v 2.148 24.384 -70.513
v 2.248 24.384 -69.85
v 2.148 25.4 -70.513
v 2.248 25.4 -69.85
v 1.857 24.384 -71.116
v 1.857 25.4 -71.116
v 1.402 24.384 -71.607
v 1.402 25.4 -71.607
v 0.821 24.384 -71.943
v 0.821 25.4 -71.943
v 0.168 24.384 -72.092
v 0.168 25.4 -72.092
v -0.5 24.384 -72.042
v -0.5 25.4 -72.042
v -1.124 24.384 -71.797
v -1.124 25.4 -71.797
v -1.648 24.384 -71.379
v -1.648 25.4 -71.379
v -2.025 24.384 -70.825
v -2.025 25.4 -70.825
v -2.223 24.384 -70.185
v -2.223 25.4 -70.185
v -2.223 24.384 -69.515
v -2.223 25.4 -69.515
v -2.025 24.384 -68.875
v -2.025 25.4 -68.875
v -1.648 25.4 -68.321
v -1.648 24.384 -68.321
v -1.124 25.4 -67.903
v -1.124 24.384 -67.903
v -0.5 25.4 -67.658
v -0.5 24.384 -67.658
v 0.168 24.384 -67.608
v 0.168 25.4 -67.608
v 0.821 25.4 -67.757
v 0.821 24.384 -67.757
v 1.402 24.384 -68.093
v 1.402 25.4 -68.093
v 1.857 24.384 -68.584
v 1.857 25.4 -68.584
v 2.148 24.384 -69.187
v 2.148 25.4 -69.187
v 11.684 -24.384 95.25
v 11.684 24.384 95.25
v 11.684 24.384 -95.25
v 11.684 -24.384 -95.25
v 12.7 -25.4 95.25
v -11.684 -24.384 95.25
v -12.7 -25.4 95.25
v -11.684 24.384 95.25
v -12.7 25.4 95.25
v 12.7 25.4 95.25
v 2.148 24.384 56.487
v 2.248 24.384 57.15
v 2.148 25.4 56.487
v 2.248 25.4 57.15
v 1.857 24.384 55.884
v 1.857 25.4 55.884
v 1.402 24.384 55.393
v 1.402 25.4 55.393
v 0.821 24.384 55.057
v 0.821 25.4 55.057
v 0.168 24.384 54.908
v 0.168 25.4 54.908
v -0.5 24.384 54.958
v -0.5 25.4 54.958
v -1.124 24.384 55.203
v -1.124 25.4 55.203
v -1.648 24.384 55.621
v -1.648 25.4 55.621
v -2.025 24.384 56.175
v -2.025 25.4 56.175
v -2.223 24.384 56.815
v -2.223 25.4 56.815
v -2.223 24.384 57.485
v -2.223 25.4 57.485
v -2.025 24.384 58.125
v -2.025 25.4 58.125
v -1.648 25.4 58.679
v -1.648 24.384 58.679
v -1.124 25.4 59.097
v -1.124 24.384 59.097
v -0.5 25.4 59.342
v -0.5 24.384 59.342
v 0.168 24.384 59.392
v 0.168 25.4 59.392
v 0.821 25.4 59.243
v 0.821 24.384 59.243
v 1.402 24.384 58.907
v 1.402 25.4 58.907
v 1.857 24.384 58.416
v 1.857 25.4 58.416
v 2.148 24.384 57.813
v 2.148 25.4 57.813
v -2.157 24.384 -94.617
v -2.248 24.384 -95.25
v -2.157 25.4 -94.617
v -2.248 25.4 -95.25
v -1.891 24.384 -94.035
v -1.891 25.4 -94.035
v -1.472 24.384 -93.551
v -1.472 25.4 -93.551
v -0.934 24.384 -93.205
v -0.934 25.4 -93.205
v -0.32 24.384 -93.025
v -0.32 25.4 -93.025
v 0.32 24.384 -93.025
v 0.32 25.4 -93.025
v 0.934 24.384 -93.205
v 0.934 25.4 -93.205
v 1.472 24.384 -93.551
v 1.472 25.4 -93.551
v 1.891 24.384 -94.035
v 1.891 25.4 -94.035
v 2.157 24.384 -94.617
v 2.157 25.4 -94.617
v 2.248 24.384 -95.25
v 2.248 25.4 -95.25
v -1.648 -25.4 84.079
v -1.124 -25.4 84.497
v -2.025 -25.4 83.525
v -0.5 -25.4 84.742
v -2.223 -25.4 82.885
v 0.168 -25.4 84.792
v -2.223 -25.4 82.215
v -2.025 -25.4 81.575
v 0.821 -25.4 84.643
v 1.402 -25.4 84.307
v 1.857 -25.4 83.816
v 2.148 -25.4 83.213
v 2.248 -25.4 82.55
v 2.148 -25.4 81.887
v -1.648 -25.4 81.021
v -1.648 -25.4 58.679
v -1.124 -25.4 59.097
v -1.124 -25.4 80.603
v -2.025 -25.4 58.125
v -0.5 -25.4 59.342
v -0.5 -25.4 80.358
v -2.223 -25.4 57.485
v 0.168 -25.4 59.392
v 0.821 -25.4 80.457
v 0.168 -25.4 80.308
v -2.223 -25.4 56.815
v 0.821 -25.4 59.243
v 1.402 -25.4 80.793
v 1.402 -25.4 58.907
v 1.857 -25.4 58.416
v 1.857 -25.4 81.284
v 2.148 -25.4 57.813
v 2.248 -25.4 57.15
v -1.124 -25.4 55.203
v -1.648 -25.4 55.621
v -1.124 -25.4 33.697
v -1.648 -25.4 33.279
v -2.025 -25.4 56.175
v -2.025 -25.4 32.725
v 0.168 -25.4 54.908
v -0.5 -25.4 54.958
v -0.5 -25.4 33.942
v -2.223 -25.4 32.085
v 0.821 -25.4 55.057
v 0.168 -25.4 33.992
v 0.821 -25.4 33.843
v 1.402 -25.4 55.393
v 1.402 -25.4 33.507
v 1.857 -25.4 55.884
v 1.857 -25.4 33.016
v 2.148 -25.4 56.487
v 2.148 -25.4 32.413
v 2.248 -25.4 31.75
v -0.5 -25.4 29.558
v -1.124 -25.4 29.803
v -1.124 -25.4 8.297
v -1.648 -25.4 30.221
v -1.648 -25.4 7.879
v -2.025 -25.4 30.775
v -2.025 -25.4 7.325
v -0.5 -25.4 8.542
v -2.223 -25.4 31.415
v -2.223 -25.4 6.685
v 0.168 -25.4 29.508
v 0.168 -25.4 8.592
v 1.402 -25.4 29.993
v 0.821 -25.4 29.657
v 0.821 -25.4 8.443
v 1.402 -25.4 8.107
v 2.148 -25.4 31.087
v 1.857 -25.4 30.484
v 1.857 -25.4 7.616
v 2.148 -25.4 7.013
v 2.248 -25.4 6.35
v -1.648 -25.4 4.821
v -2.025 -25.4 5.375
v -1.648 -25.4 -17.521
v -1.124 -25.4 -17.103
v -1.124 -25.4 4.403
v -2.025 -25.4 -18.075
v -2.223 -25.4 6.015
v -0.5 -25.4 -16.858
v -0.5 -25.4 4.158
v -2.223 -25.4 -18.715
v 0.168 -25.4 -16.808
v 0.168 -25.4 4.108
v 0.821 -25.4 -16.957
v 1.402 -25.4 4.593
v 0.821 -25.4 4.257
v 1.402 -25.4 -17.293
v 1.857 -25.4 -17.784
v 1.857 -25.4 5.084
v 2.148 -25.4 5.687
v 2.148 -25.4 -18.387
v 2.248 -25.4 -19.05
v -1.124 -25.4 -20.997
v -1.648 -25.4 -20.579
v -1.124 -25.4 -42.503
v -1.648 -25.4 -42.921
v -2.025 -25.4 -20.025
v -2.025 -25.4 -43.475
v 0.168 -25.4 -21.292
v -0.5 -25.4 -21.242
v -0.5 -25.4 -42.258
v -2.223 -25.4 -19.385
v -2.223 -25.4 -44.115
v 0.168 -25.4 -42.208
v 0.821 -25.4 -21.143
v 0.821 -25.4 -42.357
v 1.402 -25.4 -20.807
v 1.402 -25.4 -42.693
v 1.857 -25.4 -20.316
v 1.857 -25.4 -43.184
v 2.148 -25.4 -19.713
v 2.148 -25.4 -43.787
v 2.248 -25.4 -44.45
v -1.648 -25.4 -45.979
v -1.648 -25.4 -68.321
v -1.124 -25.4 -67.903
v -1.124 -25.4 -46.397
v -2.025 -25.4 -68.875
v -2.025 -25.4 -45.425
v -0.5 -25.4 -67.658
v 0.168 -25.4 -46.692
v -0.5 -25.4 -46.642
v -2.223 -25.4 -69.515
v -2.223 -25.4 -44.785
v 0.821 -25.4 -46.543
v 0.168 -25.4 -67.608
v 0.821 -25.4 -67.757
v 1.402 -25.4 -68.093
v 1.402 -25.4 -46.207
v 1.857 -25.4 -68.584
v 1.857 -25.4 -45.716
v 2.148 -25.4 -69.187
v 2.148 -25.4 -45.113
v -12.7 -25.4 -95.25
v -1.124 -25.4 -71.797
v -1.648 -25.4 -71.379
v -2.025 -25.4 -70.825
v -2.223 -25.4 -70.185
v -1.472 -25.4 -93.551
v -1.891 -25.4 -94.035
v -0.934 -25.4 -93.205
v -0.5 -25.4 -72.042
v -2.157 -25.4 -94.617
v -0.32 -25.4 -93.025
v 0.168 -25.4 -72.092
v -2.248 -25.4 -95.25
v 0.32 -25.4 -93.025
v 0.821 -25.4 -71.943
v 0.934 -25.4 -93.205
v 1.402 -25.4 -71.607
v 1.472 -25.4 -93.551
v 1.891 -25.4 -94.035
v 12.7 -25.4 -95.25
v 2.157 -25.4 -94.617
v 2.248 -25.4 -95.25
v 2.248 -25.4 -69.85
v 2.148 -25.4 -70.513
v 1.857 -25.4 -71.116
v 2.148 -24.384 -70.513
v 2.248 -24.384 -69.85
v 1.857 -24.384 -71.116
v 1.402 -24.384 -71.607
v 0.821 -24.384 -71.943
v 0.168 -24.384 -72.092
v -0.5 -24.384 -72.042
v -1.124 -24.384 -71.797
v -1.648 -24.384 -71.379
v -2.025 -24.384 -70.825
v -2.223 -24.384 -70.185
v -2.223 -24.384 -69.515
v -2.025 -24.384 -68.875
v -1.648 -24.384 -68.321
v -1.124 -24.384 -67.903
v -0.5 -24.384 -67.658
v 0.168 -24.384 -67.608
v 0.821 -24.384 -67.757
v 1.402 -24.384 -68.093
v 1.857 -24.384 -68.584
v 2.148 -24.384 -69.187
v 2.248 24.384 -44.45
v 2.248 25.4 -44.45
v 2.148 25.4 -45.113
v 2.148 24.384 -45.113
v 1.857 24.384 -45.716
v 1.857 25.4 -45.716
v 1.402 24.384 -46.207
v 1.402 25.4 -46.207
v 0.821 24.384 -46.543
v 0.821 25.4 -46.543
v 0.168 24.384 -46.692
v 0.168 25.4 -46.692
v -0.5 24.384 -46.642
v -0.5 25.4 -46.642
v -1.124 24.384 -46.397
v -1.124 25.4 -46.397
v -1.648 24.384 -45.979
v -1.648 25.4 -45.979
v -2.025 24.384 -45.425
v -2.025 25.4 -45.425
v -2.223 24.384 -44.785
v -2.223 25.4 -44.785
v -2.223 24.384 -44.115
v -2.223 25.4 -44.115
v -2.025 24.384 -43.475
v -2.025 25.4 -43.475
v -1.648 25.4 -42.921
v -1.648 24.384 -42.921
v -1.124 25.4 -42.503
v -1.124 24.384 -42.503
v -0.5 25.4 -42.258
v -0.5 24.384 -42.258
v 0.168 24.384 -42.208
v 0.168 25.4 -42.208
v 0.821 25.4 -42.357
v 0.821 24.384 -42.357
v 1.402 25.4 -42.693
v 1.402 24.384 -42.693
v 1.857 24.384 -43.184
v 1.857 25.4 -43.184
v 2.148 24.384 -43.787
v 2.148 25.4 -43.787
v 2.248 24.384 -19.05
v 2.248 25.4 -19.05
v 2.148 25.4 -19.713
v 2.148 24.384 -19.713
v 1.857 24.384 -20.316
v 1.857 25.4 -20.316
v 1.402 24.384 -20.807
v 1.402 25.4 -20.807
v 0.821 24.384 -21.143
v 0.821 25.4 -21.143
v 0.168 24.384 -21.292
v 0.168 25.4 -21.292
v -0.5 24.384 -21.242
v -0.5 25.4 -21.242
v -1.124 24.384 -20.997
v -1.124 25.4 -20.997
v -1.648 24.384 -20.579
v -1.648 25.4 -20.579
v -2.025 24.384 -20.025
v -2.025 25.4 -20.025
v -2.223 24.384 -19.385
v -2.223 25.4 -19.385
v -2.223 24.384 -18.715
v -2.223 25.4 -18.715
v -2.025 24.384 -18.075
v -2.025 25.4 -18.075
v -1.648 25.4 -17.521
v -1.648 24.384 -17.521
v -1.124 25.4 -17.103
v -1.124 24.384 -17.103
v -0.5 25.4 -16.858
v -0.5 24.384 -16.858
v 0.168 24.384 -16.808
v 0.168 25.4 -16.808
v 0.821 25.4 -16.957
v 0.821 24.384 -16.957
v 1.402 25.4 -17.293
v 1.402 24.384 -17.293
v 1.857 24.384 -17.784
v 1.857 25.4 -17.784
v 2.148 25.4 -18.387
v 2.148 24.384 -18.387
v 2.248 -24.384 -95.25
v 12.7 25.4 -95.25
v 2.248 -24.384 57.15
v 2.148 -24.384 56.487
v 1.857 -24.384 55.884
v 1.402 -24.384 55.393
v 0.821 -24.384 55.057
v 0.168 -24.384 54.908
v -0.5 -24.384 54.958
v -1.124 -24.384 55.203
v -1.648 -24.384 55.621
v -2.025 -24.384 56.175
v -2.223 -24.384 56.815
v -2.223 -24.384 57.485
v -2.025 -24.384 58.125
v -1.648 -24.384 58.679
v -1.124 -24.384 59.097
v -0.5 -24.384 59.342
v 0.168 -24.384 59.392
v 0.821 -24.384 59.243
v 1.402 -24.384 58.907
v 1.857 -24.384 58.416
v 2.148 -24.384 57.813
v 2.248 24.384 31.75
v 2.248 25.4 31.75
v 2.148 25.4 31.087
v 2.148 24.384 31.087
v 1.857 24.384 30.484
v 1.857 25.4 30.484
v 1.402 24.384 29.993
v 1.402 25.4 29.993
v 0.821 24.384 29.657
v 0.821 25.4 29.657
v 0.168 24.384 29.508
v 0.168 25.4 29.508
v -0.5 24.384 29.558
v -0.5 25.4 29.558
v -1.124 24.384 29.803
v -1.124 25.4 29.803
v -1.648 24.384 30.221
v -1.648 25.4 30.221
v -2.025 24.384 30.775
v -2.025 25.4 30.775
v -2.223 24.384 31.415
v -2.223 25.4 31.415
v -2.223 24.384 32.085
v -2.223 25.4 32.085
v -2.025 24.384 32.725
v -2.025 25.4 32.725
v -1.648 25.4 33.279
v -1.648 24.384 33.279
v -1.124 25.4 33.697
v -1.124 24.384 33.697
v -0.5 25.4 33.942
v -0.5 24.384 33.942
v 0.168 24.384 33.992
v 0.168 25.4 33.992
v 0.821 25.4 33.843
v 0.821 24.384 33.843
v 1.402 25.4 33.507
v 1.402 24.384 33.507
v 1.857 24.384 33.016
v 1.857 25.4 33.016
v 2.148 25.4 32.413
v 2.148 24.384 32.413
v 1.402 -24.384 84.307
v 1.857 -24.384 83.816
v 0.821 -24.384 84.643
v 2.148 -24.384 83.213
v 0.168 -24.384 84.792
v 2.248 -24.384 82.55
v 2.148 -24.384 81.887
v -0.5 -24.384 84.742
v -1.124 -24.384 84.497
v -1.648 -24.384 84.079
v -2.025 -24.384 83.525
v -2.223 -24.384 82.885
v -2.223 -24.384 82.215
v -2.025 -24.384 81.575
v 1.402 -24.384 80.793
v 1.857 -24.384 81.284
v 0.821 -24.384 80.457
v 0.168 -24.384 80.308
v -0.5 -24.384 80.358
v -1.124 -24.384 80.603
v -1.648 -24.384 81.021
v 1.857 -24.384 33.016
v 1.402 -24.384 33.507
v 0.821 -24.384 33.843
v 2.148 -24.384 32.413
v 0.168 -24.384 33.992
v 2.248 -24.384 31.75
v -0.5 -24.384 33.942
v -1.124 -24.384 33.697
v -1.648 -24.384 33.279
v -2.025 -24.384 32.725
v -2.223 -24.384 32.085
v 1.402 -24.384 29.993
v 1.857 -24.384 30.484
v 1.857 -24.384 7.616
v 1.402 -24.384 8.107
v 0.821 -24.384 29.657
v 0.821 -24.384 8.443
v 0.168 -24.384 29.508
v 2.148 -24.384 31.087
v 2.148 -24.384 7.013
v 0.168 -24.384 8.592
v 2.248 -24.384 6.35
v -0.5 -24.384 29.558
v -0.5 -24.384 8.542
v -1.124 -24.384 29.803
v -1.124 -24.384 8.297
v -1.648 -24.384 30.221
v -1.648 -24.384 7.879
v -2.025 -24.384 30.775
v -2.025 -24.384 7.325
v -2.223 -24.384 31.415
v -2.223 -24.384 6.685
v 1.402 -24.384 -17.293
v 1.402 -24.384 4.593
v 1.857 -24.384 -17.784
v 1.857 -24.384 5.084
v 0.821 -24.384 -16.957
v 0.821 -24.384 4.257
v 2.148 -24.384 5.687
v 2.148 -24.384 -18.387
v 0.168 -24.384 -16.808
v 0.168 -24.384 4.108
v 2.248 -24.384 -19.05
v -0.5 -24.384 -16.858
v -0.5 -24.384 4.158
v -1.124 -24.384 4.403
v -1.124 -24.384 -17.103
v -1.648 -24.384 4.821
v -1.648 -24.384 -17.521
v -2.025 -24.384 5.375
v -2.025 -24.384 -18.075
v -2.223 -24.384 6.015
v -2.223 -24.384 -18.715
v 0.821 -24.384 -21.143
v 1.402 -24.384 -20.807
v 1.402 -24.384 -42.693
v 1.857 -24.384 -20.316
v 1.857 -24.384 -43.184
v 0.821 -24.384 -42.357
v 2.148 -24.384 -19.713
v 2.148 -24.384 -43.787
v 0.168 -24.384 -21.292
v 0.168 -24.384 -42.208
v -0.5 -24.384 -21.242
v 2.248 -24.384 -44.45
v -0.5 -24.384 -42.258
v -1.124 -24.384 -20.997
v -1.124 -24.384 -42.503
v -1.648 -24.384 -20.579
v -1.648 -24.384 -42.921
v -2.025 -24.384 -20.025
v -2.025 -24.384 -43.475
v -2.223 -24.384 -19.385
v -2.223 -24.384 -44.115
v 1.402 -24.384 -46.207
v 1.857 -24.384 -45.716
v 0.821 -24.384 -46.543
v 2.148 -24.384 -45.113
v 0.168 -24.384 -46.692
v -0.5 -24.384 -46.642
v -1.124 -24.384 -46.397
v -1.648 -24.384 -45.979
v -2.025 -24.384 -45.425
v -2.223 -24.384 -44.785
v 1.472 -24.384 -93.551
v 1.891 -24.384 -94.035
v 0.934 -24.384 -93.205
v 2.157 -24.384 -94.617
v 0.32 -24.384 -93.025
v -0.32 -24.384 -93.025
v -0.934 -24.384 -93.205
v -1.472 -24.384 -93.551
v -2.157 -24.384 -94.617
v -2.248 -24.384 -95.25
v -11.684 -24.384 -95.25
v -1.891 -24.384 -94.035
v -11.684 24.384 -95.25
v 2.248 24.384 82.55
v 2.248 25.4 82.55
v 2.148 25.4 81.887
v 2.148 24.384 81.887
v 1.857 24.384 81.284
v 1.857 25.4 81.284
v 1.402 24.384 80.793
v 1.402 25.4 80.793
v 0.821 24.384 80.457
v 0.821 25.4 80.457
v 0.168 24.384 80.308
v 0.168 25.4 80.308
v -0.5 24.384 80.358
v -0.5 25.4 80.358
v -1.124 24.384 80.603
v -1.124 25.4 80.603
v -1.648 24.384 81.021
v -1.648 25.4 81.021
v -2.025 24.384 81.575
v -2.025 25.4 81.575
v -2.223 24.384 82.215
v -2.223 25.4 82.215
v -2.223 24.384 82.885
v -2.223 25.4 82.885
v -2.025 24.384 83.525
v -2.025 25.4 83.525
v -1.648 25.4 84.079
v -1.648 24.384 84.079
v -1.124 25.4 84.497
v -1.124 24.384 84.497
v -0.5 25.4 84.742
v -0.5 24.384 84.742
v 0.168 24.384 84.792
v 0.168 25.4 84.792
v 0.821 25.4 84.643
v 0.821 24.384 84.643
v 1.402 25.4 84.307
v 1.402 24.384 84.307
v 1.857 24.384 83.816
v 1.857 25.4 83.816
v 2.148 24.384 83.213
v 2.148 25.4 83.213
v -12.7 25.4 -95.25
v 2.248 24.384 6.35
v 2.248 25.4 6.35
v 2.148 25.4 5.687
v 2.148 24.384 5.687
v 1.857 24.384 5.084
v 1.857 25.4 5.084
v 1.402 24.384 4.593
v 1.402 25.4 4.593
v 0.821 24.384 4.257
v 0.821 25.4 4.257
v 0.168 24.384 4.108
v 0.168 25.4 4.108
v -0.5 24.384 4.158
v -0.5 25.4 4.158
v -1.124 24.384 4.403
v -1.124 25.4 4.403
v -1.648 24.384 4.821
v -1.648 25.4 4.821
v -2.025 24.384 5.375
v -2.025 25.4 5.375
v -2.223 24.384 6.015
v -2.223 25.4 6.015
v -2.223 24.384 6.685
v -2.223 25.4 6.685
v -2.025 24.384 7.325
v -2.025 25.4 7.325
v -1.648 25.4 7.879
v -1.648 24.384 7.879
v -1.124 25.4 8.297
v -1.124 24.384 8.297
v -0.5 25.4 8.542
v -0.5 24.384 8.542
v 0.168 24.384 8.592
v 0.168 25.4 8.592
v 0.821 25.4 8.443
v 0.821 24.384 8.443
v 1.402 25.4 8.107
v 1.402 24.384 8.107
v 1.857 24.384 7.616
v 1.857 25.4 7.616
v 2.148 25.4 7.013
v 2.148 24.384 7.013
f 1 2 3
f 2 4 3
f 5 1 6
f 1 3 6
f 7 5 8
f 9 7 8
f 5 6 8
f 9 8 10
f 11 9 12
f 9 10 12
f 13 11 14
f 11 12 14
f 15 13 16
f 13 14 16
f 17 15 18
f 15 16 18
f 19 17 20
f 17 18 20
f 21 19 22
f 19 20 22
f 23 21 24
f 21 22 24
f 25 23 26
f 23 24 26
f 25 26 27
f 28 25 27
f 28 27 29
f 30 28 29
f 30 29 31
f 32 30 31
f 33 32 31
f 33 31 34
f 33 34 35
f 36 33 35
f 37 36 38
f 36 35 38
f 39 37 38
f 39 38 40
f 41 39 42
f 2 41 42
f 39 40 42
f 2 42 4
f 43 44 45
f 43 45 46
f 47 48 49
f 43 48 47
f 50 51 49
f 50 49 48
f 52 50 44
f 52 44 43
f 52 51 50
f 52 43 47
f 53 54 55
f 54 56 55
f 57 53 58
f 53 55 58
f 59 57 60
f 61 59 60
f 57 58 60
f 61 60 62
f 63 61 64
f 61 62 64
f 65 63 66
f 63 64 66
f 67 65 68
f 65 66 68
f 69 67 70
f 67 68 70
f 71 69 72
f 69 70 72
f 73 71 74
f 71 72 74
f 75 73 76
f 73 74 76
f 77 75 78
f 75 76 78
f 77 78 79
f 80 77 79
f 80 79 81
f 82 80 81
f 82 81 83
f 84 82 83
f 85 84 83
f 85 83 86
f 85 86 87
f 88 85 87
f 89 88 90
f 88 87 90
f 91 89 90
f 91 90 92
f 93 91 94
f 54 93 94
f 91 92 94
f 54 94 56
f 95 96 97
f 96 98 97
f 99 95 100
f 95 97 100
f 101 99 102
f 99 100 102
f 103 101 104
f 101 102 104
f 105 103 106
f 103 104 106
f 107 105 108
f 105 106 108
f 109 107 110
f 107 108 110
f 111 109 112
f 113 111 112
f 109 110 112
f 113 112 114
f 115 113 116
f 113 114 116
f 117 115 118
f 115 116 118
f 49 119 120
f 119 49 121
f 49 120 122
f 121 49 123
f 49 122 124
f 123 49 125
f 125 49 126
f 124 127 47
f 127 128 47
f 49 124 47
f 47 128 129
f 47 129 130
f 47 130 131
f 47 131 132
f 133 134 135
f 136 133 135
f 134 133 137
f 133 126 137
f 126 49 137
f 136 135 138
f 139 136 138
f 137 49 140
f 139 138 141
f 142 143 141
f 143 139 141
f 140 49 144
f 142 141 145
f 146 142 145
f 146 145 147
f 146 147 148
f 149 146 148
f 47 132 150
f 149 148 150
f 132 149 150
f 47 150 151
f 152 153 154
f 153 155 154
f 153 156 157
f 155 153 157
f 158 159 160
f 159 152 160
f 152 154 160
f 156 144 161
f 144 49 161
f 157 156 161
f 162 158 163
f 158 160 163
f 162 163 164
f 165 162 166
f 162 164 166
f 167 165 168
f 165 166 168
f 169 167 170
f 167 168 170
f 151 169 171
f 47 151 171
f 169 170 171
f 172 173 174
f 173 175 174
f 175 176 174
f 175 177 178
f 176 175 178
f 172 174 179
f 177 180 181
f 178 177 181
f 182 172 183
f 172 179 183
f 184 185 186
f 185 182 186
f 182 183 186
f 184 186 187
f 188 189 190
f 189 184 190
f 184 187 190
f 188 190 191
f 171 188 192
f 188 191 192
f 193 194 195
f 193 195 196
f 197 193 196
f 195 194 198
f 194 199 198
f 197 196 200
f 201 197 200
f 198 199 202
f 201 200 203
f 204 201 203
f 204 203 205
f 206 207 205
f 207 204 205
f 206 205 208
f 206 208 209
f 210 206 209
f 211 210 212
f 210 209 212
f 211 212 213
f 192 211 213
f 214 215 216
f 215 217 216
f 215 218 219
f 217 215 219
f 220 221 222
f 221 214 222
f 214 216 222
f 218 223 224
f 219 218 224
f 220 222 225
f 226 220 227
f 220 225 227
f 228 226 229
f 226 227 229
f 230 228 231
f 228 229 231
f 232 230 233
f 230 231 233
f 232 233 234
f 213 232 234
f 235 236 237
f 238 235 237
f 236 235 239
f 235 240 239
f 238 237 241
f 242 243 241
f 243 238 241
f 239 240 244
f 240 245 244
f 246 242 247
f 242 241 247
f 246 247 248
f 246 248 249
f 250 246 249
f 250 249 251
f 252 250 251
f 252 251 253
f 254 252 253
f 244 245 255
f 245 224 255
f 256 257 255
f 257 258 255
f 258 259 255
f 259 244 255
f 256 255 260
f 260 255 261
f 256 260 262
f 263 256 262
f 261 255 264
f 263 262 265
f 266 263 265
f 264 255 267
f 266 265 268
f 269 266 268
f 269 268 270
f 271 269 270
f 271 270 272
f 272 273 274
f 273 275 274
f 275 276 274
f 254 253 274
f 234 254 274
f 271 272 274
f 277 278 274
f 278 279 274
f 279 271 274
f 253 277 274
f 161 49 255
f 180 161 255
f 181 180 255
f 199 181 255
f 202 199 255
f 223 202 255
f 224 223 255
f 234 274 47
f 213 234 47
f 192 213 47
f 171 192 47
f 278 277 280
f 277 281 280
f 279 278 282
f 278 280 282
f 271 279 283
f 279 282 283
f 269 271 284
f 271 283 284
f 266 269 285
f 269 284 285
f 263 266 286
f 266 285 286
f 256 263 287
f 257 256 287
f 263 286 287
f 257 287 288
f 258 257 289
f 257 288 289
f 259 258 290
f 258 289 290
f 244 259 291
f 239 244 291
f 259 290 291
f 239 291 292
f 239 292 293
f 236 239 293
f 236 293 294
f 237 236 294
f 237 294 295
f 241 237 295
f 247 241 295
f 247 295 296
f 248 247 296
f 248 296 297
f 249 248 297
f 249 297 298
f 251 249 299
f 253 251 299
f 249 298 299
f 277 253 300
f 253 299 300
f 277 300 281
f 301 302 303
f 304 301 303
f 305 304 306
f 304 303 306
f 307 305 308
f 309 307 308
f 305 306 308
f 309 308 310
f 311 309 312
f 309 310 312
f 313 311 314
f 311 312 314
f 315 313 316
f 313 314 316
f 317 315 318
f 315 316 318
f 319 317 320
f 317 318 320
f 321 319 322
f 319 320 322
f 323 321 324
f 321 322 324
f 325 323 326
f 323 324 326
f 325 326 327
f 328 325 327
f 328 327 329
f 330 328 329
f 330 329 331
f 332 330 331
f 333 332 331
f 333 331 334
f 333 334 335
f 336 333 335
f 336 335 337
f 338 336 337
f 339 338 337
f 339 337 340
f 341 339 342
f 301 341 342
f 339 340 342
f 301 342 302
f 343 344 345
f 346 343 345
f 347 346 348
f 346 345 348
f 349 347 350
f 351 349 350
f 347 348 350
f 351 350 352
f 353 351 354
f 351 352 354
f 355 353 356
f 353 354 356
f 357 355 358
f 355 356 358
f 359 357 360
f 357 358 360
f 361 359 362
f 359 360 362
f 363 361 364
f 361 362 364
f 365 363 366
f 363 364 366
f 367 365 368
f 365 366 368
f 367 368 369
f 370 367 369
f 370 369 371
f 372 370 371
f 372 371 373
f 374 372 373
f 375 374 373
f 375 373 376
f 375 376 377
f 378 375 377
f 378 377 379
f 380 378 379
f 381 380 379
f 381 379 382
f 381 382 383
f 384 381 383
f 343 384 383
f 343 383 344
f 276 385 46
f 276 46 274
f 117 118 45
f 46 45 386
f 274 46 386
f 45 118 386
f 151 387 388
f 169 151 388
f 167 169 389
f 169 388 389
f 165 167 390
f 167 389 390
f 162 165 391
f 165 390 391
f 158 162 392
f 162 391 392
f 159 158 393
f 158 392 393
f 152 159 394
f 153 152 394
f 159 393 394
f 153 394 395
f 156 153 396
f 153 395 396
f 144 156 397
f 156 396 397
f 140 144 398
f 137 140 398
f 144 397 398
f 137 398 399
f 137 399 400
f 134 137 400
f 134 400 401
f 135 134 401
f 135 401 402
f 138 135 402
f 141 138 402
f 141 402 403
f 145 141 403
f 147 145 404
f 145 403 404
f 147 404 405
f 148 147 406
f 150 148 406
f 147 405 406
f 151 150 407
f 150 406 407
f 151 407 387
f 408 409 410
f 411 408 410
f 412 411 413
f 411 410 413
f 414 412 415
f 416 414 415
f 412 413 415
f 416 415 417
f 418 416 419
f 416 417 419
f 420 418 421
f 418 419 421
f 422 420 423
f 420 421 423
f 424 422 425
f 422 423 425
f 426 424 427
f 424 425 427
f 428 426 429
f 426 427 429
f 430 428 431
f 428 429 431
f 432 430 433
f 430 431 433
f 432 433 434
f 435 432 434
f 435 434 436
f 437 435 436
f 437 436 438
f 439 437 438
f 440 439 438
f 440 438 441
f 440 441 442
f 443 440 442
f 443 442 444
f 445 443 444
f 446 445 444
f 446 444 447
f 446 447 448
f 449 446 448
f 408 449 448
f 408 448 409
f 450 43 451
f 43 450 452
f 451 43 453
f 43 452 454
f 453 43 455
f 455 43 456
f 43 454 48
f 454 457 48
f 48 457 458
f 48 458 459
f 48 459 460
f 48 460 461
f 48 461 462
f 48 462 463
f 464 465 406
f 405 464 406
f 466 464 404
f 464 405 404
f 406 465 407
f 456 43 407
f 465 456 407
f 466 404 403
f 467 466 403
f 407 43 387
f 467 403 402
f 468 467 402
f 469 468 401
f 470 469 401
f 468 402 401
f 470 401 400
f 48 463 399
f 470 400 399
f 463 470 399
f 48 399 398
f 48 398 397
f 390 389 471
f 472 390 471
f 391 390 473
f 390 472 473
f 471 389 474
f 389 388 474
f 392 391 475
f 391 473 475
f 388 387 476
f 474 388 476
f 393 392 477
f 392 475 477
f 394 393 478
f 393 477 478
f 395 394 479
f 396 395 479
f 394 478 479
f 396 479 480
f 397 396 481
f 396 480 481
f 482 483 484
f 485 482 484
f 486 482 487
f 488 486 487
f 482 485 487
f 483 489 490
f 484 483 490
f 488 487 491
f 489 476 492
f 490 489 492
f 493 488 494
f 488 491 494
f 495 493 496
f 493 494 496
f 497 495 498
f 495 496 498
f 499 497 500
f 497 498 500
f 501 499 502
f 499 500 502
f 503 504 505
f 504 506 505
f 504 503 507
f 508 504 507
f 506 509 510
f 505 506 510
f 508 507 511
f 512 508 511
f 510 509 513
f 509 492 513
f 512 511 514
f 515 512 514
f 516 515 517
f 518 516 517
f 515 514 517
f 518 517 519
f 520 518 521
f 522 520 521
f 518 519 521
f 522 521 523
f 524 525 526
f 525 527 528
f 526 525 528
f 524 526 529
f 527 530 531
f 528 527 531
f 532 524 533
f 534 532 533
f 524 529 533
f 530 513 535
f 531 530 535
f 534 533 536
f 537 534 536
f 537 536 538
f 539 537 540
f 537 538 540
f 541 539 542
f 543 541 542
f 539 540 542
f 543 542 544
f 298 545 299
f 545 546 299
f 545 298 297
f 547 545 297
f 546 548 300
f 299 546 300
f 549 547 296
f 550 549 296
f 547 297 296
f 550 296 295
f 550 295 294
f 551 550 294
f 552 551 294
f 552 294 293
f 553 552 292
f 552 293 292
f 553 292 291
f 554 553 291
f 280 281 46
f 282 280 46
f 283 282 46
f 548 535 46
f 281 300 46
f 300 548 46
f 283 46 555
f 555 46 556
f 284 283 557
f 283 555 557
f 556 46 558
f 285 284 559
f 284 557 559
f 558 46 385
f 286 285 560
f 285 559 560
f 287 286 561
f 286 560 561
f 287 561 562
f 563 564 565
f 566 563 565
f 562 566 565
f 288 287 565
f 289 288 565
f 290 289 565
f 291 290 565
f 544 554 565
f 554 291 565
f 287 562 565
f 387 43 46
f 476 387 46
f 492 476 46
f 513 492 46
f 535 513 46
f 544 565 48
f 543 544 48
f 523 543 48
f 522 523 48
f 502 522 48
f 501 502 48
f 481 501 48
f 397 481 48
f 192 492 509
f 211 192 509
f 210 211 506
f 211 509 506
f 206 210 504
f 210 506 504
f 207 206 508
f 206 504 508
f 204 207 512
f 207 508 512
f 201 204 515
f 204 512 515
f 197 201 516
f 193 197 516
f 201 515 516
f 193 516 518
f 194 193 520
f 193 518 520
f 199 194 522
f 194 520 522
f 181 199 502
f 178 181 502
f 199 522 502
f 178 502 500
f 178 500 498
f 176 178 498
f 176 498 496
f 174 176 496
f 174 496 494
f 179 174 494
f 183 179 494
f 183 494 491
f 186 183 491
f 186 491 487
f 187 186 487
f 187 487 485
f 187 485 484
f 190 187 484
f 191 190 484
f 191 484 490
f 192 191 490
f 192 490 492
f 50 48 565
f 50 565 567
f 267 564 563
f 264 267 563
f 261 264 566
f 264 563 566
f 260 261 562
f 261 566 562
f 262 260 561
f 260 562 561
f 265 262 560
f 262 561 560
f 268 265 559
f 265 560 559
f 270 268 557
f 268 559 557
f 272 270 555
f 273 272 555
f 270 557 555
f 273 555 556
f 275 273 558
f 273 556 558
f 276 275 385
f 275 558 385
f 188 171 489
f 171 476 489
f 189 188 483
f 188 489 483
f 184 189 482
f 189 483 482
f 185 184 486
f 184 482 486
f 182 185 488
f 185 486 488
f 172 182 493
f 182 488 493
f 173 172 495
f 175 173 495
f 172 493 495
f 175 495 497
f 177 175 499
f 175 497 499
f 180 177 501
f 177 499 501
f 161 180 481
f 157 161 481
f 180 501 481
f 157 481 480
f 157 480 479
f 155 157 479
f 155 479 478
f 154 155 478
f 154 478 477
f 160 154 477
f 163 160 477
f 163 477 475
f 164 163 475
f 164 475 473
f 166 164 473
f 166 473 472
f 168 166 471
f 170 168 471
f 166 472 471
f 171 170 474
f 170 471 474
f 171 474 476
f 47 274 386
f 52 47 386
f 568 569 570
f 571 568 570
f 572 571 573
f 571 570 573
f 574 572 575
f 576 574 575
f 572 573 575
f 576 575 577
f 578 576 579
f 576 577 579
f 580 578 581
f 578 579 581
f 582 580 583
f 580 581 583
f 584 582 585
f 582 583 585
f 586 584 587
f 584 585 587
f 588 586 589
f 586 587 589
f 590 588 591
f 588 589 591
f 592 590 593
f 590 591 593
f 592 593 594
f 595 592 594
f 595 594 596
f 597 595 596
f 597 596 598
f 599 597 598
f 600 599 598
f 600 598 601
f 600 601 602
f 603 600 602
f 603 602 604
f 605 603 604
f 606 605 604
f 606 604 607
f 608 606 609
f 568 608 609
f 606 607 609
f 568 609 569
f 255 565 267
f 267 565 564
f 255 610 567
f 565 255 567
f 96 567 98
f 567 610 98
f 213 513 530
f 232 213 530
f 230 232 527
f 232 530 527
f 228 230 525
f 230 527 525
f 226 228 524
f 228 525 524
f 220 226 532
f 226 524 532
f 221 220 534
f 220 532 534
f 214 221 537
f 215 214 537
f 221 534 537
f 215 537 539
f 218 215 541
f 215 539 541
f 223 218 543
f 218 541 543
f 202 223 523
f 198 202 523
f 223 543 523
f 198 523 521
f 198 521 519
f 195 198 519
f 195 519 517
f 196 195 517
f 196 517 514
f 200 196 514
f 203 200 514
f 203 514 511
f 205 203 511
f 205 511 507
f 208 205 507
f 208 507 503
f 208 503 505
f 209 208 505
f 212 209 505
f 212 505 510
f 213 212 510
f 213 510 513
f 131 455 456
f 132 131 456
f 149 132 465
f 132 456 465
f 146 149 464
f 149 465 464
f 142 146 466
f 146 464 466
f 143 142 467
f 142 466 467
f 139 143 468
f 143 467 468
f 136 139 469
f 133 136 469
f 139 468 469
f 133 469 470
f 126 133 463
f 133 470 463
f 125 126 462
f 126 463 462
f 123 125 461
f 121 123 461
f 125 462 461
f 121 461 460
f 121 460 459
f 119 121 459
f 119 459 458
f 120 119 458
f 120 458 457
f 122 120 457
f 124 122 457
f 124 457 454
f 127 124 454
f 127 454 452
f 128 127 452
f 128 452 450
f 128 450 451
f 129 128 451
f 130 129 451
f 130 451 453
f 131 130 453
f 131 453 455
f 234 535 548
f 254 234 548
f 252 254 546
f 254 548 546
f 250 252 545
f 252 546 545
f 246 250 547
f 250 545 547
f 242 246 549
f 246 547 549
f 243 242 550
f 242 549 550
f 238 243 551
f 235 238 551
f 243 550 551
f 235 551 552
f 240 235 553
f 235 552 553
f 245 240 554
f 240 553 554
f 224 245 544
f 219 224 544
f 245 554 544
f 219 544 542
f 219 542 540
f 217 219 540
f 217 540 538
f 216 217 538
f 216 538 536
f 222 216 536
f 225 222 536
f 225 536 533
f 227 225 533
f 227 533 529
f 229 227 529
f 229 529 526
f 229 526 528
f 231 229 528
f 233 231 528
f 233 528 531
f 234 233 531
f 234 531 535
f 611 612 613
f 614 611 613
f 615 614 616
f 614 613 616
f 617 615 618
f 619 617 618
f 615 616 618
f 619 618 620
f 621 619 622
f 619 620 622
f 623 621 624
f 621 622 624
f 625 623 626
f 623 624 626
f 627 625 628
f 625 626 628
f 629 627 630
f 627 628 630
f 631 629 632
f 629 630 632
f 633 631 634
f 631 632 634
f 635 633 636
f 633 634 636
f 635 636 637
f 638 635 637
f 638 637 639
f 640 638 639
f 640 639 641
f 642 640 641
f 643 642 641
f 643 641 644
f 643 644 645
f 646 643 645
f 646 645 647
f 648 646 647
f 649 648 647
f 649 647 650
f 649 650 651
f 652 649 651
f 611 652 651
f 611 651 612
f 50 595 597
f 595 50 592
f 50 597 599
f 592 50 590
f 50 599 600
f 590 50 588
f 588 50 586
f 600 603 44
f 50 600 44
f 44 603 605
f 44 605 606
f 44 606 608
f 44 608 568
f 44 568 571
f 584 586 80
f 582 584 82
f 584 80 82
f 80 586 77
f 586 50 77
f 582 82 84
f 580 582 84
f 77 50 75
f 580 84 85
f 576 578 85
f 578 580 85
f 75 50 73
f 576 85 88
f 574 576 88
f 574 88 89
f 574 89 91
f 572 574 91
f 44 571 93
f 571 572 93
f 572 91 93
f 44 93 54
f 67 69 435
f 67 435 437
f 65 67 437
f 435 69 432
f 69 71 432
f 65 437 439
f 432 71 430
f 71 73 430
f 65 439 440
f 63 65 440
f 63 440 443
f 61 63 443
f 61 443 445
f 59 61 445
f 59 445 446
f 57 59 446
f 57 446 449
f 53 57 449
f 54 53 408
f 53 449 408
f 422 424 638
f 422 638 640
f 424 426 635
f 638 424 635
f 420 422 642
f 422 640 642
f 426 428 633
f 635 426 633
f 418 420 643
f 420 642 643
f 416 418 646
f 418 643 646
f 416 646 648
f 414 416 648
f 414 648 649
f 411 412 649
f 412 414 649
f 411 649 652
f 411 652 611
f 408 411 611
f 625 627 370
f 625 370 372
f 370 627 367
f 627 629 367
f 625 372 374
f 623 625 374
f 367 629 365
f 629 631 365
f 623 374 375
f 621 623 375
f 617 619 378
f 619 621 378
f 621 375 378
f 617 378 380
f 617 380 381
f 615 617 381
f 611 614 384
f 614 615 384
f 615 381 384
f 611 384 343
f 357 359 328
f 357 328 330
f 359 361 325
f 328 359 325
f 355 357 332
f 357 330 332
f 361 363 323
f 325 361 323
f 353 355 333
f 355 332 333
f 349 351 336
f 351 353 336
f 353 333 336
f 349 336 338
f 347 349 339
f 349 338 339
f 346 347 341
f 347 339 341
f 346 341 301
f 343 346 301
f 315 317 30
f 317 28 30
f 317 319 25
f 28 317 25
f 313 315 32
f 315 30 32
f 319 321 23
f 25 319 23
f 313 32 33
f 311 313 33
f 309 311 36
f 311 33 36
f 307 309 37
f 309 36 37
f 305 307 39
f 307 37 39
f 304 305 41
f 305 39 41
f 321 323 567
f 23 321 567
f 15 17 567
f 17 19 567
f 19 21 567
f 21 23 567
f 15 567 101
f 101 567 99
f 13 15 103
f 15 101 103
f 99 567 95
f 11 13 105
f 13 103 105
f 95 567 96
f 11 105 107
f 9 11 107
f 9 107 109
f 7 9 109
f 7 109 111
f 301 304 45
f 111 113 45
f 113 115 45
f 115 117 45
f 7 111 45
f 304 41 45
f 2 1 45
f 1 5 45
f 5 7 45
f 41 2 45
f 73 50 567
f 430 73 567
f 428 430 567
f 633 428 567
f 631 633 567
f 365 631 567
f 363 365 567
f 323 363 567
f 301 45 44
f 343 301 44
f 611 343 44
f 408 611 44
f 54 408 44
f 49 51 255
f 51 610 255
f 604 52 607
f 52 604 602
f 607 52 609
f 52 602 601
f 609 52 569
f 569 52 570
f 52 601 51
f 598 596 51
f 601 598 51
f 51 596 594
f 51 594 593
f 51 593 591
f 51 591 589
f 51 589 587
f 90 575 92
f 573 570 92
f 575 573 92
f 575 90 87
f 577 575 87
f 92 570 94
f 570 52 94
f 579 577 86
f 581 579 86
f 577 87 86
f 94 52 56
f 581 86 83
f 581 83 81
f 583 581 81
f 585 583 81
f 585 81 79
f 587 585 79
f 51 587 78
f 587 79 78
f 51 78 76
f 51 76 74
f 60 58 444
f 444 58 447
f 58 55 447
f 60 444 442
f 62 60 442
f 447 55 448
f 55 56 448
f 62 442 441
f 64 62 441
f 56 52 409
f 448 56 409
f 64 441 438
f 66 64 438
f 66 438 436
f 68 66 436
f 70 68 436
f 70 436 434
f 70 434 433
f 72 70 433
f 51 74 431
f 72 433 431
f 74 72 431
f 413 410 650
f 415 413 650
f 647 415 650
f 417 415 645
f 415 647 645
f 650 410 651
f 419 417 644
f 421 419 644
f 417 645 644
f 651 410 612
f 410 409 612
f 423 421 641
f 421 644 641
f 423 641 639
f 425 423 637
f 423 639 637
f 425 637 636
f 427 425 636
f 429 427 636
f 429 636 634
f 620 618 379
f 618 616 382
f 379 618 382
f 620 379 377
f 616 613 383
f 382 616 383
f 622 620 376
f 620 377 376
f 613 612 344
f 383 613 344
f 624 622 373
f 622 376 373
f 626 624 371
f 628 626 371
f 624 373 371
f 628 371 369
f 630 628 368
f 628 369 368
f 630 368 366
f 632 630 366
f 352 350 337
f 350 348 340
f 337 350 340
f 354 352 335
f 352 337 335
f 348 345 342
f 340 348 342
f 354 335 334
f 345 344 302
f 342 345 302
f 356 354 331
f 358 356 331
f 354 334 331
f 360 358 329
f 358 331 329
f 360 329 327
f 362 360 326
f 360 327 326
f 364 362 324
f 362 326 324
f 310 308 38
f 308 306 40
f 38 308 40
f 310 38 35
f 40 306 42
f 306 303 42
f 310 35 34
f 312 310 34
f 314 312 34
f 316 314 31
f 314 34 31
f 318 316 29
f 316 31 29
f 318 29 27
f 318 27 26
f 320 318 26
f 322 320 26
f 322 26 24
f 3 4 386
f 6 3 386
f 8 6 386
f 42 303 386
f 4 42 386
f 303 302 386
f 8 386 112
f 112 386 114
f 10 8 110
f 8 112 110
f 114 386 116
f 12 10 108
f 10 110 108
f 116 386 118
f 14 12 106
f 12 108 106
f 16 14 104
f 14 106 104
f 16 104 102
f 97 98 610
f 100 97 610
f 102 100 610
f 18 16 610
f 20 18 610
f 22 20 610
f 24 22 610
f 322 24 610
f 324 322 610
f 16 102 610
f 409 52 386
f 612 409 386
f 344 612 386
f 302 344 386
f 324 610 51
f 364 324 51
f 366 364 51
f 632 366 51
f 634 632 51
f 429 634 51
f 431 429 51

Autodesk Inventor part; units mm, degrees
ref_plane "YZ Plane" through (0, 0, 0) normal (1, 0, 0) x (0, 1, 0)
ref_plane "XZ Plane" through (0, 0, 0) normal (0, 1, 0) x (-1, 0, 0)
ref_plane "XY Plane" through (0, 0, 0) normal (0, 0, 1) x (1, 0, 0)
sketch "Sketch1" plane through (0, 0, 0) normal (0, 0, 1) x (1, 0, 0)
  line L0 (12.7, 25.4) -> (-12.7, 25.4)
  line L1 (-12.7, 25.4) -> (-12.7, -25.4)
  line L2 (-12.7, -25.4) -> (12.7, -25.4)
  line L3 (12.7, -25.4) -> (12.7, 25.4)
  line L4 (12.7, 25.4) -> (-12.7, -25.4) construction
  line L5 (-12.7, 25.4) -> (12.7, -25.4) construction
  line L6 (-11.684, 24.384) -> (11.684, 24.384)
  line L7 (11.684, 24.384) -> (11.684, -24.384)
  line L8 (11.684, -24.384) -> (-11.684, -24.384)
  line L9 (-11.684, -24.384) -> (-11.684, 24.384)
  point P0 (0, 0)
  dimension "d0" = 1.016
  dimension "d1" = 50.8
  dimension "d2" = 25.4
extrude "Tube Length" add sketch "Sketch1" along normal mid plane 190.5
sketch "Sketch2" plane through (-12.7, 25.4, 95.25) normal (0, 1, 0) x (1, 0, 0)
  line L0 (0, 0) -> (0, 190.5) projected
  line L1 (25.4, 0) -> (0, 0) projected
  line L2 (25.4, 190.5) -> (25.4, 0) projected
  line L3 (0, 190.5) -> (25.4, 190.5) projected
  line L4 (25.4, 0) -> (0, 0) projected
  line L5 (12.7, 0) -> (12.7, 12.7) construction
  circle A0 centre (12.7, 12.7) radius 2.2479
  point P0 (12.7, 95.25)
  dimension "d5" = 12.7
  dimension "d6" = 4.4958
extrude "Top Hole" cut sketch "Sketch2" against normal through all contours A0
pattern_linear "Rectangular Pattern1" count 8 spacing 25.4 along (0, 0, -1) of "Top Hole"
sketch "Sketch3" plane through (0, 0, 95.25) normal (0, 0, 1) x (1, 0, 0)
  line L0 (0, 0) -> (0, 25.4) construction
  line L1 (12.7, 25.4) -> (-12.7, 25.4) projected
  line L2 (-0.0508, 25.4) -> (0, 25.2984)
  line L3 (0.0508, 25.4) -> (0, 25.2984)
  line L4 (-12.7, 12.6492) -> (-12.5984, 12.7)
  line L5 (-12.7, 12.7508) -> (-12.5984, 12.7)
  line L6 (-12.7, -0.0508) -> (-12.5984, 0)
  line L7 (-12.7, 0.0508) -> (-12.5984, 0)
  line L8 (-12.7, -12.7508) -> (-12.5984, -12.7)
  line L9 (-12.7, -12.6492) -> (-12.5984, -12.7)
  line L10 (12.7, 0.0508) -> (12.5984, 0)
  line L11 (12.7, 12.6492) -> (12.5984, 12.7)
  line L12 (12.7, 12.7508) -> (12.5984, 12.7)
  line L13 (12.7, -0.0508) -> (12.5984, 0)
  line L14 (12.7, -12.6492) -> (12.5984, -12.7)
  line L15 (12.7, -12.7508) -> (12.5984, -12.7)
  line L16 (0.0508, -25.4) -> (0, -25.2984)
  line L17 (-0.0508, -25.4) -> (0, -25.2984)
  line L18 (-12.7, 25.4) -> (-12.7, -25.4) projected
  line L19 (12.7, -25.4) -> (12.7, 25.4) projected
  line L20 (-12.7, -25.4) -> (12.7, -25.4) projected
  point P0 (0, 12.7)
  point P1 (-12.7, 12.7)
  point P2 (-12.7, 0)
  point P3 (-12.7, -12.7)
  point P4 (12.7, 12.7)
  point P5 (12.7, 0)
  point P6 (12.7, -12.7)
  point P7 (0, -25.4)
  dimension "d12" = 0.1016
  dimension "d13" = 0.1016
  dimension "d16" = 90
  dimension "d20" = 12.7
  dimension "d27" = 360
equation "\"d13\" = d12"
properties part number "Stage 2 Bottom & Top Tube" material "Aluminum 6061"
